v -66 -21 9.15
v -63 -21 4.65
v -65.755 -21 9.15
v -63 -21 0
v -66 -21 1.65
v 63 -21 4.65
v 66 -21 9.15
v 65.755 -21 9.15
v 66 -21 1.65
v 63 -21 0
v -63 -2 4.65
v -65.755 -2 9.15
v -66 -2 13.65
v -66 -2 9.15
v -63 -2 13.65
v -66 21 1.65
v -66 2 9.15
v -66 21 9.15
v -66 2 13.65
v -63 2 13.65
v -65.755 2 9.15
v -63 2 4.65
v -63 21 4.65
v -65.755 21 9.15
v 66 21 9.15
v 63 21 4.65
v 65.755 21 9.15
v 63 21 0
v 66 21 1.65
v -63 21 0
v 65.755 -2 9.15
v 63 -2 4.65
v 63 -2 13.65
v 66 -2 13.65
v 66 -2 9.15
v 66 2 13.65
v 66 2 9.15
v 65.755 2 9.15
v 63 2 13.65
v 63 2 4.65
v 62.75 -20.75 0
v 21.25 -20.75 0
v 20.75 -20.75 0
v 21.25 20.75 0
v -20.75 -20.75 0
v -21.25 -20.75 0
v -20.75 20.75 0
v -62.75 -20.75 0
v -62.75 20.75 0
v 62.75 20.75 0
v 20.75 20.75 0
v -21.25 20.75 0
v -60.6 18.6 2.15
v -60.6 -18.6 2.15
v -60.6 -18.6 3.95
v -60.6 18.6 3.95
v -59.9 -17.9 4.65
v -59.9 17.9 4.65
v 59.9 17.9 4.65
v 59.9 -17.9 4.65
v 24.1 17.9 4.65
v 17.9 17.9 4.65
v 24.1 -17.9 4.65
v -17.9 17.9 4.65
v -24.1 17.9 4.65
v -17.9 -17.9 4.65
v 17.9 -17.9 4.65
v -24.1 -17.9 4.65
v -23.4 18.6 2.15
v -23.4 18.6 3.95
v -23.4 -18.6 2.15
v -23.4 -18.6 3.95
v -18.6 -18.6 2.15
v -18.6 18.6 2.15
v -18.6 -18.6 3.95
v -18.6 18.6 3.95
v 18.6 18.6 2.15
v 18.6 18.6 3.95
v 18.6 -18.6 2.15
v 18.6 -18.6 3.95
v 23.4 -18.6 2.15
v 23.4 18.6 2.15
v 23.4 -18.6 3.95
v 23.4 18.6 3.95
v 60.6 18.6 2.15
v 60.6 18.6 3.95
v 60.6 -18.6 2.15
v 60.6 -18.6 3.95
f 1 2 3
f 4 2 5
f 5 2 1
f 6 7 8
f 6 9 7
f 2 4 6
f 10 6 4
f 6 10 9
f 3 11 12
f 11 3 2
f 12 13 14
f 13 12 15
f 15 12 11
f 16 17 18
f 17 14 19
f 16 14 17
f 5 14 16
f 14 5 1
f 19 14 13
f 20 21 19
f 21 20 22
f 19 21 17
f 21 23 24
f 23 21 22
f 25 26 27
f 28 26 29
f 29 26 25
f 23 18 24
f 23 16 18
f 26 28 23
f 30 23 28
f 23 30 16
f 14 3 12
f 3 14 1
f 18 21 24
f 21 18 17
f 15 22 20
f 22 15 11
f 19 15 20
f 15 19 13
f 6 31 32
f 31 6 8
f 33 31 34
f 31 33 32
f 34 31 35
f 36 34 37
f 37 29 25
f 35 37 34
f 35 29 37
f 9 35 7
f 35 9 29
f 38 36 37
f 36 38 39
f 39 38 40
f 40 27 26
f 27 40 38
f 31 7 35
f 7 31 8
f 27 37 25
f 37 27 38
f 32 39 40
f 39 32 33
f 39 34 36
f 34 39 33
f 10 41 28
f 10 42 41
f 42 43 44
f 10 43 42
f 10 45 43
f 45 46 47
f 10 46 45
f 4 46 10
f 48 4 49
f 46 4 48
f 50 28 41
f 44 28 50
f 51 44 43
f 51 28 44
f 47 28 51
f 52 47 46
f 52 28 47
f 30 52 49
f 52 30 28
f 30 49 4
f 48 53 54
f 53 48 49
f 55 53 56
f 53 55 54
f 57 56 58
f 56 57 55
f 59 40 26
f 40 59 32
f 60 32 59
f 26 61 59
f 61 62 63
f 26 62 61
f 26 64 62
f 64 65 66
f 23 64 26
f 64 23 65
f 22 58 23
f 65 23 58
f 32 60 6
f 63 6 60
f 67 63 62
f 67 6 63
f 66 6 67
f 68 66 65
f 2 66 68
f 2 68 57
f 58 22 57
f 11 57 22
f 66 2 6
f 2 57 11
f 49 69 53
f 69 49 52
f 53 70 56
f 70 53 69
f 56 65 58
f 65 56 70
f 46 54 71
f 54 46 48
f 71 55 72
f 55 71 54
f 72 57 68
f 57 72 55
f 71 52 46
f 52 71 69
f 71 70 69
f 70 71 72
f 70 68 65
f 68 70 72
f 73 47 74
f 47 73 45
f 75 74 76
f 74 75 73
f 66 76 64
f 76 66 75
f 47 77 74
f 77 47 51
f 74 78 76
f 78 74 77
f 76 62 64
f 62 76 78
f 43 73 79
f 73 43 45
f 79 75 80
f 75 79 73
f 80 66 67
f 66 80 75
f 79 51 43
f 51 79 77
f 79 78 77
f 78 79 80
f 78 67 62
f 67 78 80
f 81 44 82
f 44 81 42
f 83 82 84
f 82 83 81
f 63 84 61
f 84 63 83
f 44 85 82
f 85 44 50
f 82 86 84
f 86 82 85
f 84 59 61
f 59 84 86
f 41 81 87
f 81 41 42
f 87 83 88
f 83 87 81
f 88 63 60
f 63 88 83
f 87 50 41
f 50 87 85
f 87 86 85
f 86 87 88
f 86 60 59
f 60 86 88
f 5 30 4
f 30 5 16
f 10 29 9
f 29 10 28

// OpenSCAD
// file: constants.scad
// Copyright Ian G. Clifton 2026
// Apache 2.0 license
// https://github.com/IanGClifton/modular-paint-stack

GRIDFINITY_DIMENSION = 42;
CIRCLE_RESOLUTION = 100;

SHELF_SUPPORT_WIDTH = 3;
SHELF_SUPPORT_BLOCK_PROTRUSION = 9;
SHELF_SUPPORT_BLOCK_X = 3;
SHELF_SUPPORT_BLOCK_Y = 4;
SHELF_SUPPORT_ANGLE_X = 3;
SHELF_SUPPORT_ANGLE_Y = (GRIDFINITY_DIMENSION - SHELF_SUPPORT_BLOCK_Y) / 2;
SHELF_SUPPORT_ANGLE_PROTRUSION = 4.9;
SHELF_SUPPORT_SPACING = 2;
SHELF_SUPPORT_ANGLE_CUT = 0.4;

SHELF_THICKNESS = 3;
SHELF_MIN_BACK_RAIL = 8;

SIDE_X = 8;
SIDE_Y = GRIDFINITY_DIMENSION;

DOVETAIL_XMIN = 3.0;
DOVETAIL_XMAX = 4.0;
DOVETAIL_YDEPTH = 3.0;
DOVETAIL_ZDIFF = 5.0;
DOVETAIL_ZMAX = 30.0;
DOVETAIL_ZMIN = DOVETAIL_ZMAX - DOVETAIL_ZDIFF;
DOVETAIL_OFFSET = (SIDE_X / 2) - (DOVETAIL_XMAX / 2);

SHELF_BRACKET_WIDTH = 2;
SHELF_BRACKET_OPENING_HEIGHT = 5;
SHELF_BRACKET_OPENING_WIDTH = 3;
SHELF_BRACKET_CONNECTION_HEIGHT = 4;
SHELF_BRACKET_Y_DEPTH = 19;
SHELF_BRACKET_Y_GAP = 4;

CUTOUT_SHAPE_NONE = 0;
CUTOUT_SHAPE_OVAL = 1;
CUTOUT_SHAPE_RECTANGLE = 2;
CUTOUT_SHAPE_ANGLED_RECTANGLE = 3;

function getShelfMainWidth(gridfinityUnits) = GRIDFINITY_DIMENSION * gridfinityUnits;

function getShelfFullWidth(gridfinityUnits) = (SHELF_SUPPORT_WIDTH * 2) + getShelfMainWidth(gridfinityUnits);
// file: shelf_base.scad
// Copyright Ian G. Clifton 2026
// Apache 2.0 license
// https://github.com/IanGClifton/modular-paint-stack

include <constants.scad>

/**
  * Creates an empty shelf
  *
  * The shelf has the support pieces to fit into the walls,
  * but the top of the shelf is flat with no cutouts for
  * paints, brushes, etc.
  */
module uniformShelf(gridfinityWidth) {
    union() {
        // Shelf main
        cube([getShelfFullWidth(gridfinityWidth), GRIDFINITY_DIMENSION, SHELF_THICKNESS]);
        
        // Support on each end
        shelfSupport();
        translate([getShelfFullWidth(gridfinityWidth), 0, 0])
            mirror([1, 0, 0])
                shelfSupport();
    }
}

/**
  * Modifies the uniformShelf() to be thicker or thinner
  *
  * This adjusts only the center of the shelf where paints
  * would go, allowing the thickness of this part of the shelf
  * to match the paint neck height.
  */
module thicknessAdjustedShelf(gridfinityWidth, targetThickness) {
    if (targetThickness == SHELF_THICKNESS) {
        uniformShelf(gridfinityWidth);
    } else if (targetThickness > SHELF_THICKNESS) {
        // Thicken the shelf
        union() {
            uniformShelf(gridfinityWidth);
            translate([SHELF_SUPPORT_WIDTH + SHELF_SUPPORT_SPACING, 0, SHELF_THICKNESS])
                cube([getShelfMainWidth(gridfinityWidth) - (SHELF_SUPPORT_SPACING * 2), GRIDFINITY_DIMENSION, targetThickness - SHELF_THICKNESS]);
        }
    } else {
        // Thin the shelf
        difference() {
            uniformShelf(gridfinityWidth);
            translate([SHELF_SUPPORT_WIDTH + SHELF_SUPPORT_SPACING, 0, targetThickness])
                cube([getShelfMainWidth(gridfinityWidth) - (SHELF_SUPPORT_SPACING * 2), GRIDFINITY_DIMENSION, SHELF_THICKNESS - targetThickness]);
        }
    }
}

/**
  * Creates the two triangles and center block used to connect
  * the shelf to the shelf brackets on the sides
  */
module shelfSupport() {
    topPoint = SHELF_THICKNESS + SHELF_SUPPORT_ANGLE_PROTRUSION;
    triangle_points = [
        // Front
        [0, 0, topPoint],                             // 0 TL
        [SHELF_SUPPORT_BLOCK_X, 0, SHELF_THICKNESS],  // 1 BR
        [0, 0, SHELF_THICKNESS],                      // 2 BL
        // Back
        [0, SHELF_SUPPORT_ANGLE_Y, topPoint],                            // 3 TL
        [SHELF_SUPPORT_BLOCK_X, SHELF_SUPPORT_ANGLE_Y, SHELF_THICKNESS], // 4 BR
        [0, SHELF_SUPPORT_ANGLE_Y, SHELF_THICKNESS]                      // 5 BL
    ];
    triangle_faces = [
        [0, 1, 2],    // Front face
        [3, 5, 4],    // Back face
        [3, 0, 2, 5], // Left side
        [3, 4, 1, 0], // Top
        [2, 1, 4, 5]  // Bottom  
    ];
    triangle_offset = SHELF_SUPPORT_ANGLE_Y + SHELF_SUPPORT_BLOCK_Y;
    union() {
        difference() {
            // Two triangles
            for (i = [0 : 1]) {
                translate([0, i * triangle_offset, 0])
                polyhedron(points = triangle_points, faces = triangle_faces);
            }
            // Cube to "cut" the tip of the triangles
            translate([0, 0, topPoint - SHELF_SUPPORT_ANGLE_CUT])
                cube([SHELF_SUPPORT_BLOCK_X, (SHELF_SUPPORT_ANGLE_Y * 2) + SHELF_SUPPORT_BLOCK_Y, SHELF_SUPPORT_ANGLE_CUT]);
        }
        // Add the block protrusion
        translate([0, SHELF_SUPPORT_ANGLE_Y, SHELF_THICKNESS])
            cube([SHELF_SUPPORT_BLOCK_X, SHELF_SUPPORT_BLOCK_Y, SHELF_SUPPORT_BLOCK_PROTRUSION]);
    }
}
// main file
// Copyright Ian G. Clifton 2026
// Apache 2.0 license
// https://github.com/IanGClifton/modular-paint-stack

// Gridfinity units (42mm each) to make the width of the inner shelf part  
shelf_gridfinity_unit_width = 3;
// True if you want the Gridfinity base on top of a solid shelf
solid_shelf = false;


GRIDFINITY_BASE_BOTTOM = 0.7;
GRIDFINITY_BASE_MIDDLE = 1.8;
GRIDFINITY_BASE_TOP = 2.15;

GRIDFINITY_BASE_HEIGHT = GRIDFINITY_BASE_BOTTOM  + GRIDFINITY_BASE_MIDDLE + GRIDFINITY_BASE_TOP;
GRIDFINITY_BASE_MIDDLE_HEIGHT = GRIDFINITY_BASE_BOTTOM  + GRIDFINITY_BASE_MIDDLE;
GRIDFINITY_BASE_TOP_WIDTH = 0.25;
GRIDFINITY_BASE_WALL_INSET = GRIDFINITY_BASE_TOP_WIDTH + GRIDFINITY_BASE_TOP;
GRIDFINITY_BASE_FULL_INSET = GRIDFINITY_BASE_WALL_INSET + GRIDFINITY_BASE_BOTTOM;

include <shelf_base.scad>


module gridfinityBasePortion() {
    points = [
        // Front
        [0, 0, GRIDFINITY_BASE_HEIGHT],                                 // 0 TL
        [GRIDFINITY_BASE_TOP_WIDTH, 0, GRIDFINITY_BASE_HEIGHT],         // 1 TR
        [GRIDFINITY_BASE_WALL_INSET, 0, GRIDFINITY_BASE_MIDDLE_HEIGHT], // 2 Wall top
        [GRIDFINITY_BASE_WALL_INSET, 0, GRIDFINITY_BASE_BOTTOM],        // 3 Wall bottom
        [GRIDFINITY_BASE_FULL_INSET, 0, 0],                             // 4 BR
        [0, 0, 0],                                                      // 5 BL
        // Back
        [0, GRIDFINITY_DIMENSION, GRIDFINITY_BASE_HEIGHT],                                 // 6  TL
        [GRIDFINITY_BASE_TOP_WIDTH, GRIDFINITY_DIMENSION, GRIDFINITY_BASE_HEIGHT],         // 7  TR
        [GRIDFINITY_BASE_WALL_INSET, GRIDFINITY_DIMENSION, GRIDFINITY_BASE_MIDDLE_HEIGHT], // 8  Wall top
        [GRIDFINITY_BASE_WALL_INSET, GRIDFINITY_DIMENSION, GRIDFINITY_BASE_BOTTOM],        // 9  Wall bottom
        [GRIDFINITY_BASE_FULL_INSET, GRIDFINITY_DIMENSION, 0],                             // 10 BR
        [0, GRIDFINITY_DIMENSION, 0],                                                      // 11 BL

    ];
    faces = [
        [0, 1, 2, 3, 4, 5],   // Front
        [11, 10, 9, 8, 7, 6], // Back
        [6, 7, 1, 0],         // Top
        [7, 8, 2, 1],         // Top slant
        [2, 8, 9, 3],         // Wall
        [3, 9, 10, 4],        // Bottom slant
        [11, 5, 4, 10],       // Bottom
        [0, 5, 11, 6]         // Left
    ];
    polyhedron(points, faces);
}

module gridfinitySingleBase() {
    union() {
        gridfinityBasePortion();
        translate([GRIDFINITY_DIMENSION, 0, 0]) {
            rotate([0, 0, 90]) {
                gridfinityBasePortion();
            }
        }
        translate([0, GRIDFINITY_DIMENSION, 0]) {
            rotate([0, 0, 270]) {
                gridfinityBasePortion();
            }
        }
        translate([GRIDFINITY_DIMENSION, GRIDFINITY_DIMENSION, 0]) {
            rotate([0, 0, 180]) {
                gridfinityBasePortion();
            }
        }
    }
}

module gridfinityBase(gridfinityWidth) {
    for (i = [0 : gridfinityWidth - 1]) {
        translate([GRIDFINITY_DIMENSION * i, 0, 0]) {
            gridfinitySingleBase();
        }
    }
}

module endTriangle(zDepth) {
    points = [
        // Front
        [0, 0, 0],                        // 0 TL
        [SHELF_SUPPORT_WIDTH, 0, 0],      // 1 TR
        [SHELF_SUPPORT_WIDTH, 0, -zDepth], // 2 BR
        // Back
        [0, GRIDFINITY_DIMENSION, 0],                        // 3 TL
        [SHELF_SUPPORT_WIDTH, GRIDFINITY_DIMENSION, 0],      // 4 TR
        [SHELF_SUPPORT_WIDTH, GRIDFINITY_DIMENSION, -zDepth], // 5 BR
    ];
    faces = [
        [0, 1, 2],    // Front
        [5, 4, 3],    // Back
        [3, 4, 1, 0], // Top
        [1, 4, 5, 2], // Right
        [0, 2, 5, 3]  // Bottom slant
    ];
    polyhedron(points, faces);
}

module endTrianglePair(zDepth, gridfinityWidthGap) {
    endTriangle(zDepth);
    translate([(2 * SHELF_SUPPORT_WIDTH) + (GRIDFINITY_DIMENSION * gridfinityWidthGap), GRIDFINITY_DIMENSION, 0]) {
        rotate([0, 0, 180]) {
            endTriangle(zDepth);
        }
    }
}

module gridfinityShelfOnTop(gridfinityWidth) {
    union() {
        uniformShelf(gridfinityWidth);
        
        translate([SHELF_SUPPORT_WIDTH, GRIDFINITY_DIMENSION, 0]) {
            rotate([180, 0, 0]) {
                gridfinityBase(shelf_gridfinity_unit_width);
            }
        }
        endTrianglePair(GRIDFINITY_BASE_HEIGHT, gridfinityWidth);
    }
}

module gridfinityShelfInset(gridfinityWidth) {
    union() {
        difference() {
            uniformShelf(gridfinityWidth);
            translate([SHELF_SUPPORT_WIDTH, 0, 0]) {
                cube([GRIDFINITY_DIMENSION * gridfinityWidth, GRIDFINITY_DIMENSION, SHELF_THICKNESS]);
            }
        }
        
        translate([SHELF_SUPPORT_WIDTH, GRIDFINITY_DIMENSION, SHELF_THICKNESS]) {
            rotate([180, 0, 0]) {
                gridfinityBase(shelf_gridfinity_unit_width);
            }
        }
        endTrianglePair(GRIDFINITY_BASE_HEIGHT - SHELF_THICKNESS, gridfinityWidth);
    }
}

if (solid_shelf) {
    translate([-getShelfFullWidth(shelf_gridfinity_unit_width) / 2, -GRIDFINITY_DIMENSION / 2, GRIDFINITY_BASE_HEIGHT]) {
        gridfinityShelfOnTop(shelf_gridfinity_unit_width);  
    }
} else {
    translate([-getShelfFullWidth(shelf_gridfinity_unit_width) / 2, -GRIDFINITY_DIMENSION / 2, GRIDFINITY_BASE_HEIGHT - SHELF_THICKNESS]) {
        gridfinityShelfInset(shelf_gridfinity_unit_width);
    }
}
